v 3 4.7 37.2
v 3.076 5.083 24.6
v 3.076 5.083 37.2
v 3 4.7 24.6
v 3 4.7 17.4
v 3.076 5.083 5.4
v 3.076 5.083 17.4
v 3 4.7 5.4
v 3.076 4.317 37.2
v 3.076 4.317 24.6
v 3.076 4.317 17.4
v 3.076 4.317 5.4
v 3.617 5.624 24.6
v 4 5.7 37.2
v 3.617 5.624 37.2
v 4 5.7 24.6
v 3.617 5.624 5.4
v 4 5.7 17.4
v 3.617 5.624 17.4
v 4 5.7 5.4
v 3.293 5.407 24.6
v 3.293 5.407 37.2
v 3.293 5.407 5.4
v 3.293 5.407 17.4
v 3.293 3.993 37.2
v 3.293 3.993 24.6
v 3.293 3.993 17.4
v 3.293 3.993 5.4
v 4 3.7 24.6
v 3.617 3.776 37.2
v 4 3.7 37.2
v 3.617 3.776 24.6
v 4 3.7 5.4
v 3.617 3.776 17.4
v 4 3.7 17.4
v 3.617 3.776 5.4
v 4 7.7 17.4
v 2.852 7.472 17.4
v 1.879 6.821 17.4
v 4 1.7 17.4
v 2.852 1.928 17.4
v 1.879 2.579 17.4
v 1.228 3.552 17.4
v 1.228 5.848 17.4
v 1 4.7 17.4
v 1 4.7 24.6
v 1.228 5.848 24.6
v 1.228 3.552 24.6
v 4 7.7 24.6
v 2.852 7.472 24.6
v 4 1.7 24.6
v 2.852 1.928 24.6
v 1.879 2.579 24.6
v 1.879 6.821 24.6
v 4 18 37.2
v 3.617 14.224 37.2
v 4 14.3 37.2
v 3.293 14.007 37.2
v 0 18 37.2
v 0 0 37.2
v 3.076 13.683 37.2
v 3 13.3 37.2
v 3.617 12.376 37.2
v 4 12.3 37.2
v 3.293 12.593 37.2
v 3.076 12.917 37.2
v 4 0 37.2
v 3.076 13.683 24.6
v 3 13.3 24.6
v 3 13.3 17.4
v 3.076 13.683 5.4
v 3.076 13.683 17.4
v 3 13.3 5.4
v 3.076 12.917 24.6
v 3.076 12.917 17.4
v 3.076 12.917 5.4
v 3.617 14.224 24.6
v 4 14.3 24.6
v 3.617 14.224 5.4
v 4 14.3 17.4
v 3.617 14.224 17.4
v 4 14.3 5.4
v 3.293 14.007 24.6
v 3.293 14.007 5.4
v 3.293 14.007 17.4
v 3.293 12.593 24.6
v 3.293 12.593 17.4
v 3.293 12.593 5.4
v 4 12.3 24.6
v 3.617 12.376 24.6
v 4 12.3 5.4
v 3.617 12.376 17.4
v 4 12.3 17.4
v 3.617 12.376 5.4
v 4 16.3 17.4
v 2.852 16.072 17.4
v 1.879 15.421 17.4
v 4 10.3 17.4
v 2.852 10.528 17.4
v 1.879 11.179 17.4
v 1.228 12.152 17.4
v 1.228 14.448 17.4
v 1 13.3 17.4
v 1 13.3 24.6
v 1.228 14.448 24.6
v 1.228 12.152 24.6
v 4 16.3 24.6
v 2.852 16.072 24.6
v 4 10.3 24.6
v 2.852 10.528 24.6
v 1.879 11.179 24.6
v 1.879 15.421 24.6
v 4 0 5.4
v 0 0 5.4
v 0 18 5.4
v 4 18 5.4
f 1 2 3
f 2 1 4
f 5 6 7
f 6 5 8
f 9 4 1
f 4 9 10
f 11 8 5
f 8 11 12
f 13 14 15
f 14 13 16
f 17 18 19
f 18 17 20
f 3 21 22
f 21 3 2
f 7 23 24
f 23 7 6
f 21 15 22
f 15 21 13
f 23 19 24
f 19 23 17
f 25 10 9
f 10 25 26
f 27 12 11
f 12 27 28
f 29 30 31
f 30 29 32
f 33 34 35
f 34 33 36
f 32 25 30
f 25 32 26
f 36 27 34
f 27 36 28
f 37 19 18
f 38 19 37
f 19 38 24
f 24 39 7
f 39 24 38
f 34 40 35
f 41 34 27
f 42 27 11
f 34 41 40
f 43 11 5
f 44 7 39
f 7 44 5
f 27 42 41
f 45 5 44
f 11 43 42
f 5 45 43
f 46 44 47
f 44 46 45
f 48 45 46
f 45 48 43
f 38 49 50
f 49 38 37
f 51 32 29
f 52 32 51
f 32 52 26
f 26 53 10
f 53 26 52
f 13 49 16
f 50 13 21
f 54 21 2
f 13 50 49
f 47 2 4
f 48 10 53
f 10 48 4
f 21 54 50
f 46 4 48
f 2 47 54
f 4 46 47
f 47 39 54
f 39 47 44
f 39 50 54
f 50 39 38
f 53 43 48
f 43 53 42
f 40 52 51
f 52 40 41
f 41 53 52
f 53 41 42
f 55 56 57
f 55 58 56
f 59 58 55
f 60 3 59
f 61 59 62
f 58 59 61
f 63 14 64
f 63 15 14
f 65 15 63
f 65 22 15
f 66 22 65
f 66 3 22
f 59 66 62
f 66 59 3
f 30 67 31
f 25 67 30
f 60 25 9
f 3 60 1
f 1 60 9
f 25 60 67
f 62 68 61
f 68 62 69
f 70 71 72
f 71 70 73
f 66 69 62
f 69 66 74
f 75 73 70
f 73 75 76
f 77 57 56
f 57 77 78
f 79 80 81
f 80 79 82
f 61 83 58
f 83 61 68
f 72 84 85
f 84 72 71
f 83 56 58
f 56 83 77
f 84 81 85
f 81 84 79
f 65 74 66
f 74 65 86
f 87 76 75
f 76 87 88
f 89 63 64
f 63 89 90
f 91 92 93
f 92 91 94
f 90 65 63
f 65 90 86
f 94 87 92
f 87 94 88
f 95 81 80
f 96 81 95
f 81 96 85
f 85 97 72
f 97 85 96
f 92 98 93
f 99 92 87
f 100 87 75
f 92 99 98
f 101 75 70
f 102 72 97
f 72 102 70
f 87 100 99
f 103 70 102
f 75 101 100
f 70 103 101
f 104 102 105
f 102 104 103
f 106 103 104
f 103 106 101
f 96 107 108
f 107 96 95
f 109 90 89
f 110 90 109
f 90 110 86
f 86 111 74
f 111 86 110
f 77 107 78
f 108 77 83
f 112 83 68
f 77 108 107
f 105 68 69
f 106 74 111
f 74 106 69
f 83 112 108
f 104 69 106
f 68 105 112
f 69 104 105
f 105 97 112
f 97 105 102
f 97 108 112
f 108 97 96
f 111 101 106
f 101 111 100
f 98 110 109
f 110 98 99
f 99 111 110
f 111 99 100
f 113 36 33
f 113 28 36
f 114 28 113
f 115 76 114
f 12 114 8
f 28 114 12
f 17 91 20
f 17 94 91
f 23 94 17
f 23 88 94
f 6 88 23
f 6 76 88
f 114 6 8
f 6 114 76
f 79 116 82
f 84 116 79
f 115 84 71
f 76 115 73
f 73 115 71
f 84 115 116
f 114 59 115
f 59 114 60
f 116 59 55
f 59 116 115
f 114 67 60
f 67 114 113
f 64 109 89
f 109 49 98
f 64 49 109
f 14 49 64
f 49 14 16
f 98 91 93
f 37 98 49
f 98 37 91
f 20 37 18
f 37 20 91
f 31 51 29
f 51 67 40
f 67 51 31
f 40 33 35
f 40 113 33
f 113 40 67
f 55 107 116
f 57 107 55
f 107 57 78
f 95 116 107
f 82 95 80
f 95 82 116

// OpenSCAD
//Abstand linker zu rechter Rand der beiden Zwergstecker
a=10.6;
//Durchmesser Zwerstecker
d=2.6;
//Breite Zwergsteckerleiste
b=18;
//Tiefe Stecker
t=8;
//nageldurchmesser
nd=2;
//Nagellänge Total
nlt=24.6;
//Durchmesser Nagelkopf
dnk=4*1.5;
//Höhe Nagelkopf
hnk=1.8*4;
//Höhe wenn eingesteckt bis unter Nagelkopf
he=19.2;
//Tiefe eingesteckt (das nehmen wir eben oben am Stecker auch als Länge für den Kabelkanal 
te=nlt-he;
//Abstand Rand Loch von Rand Stecker
r=(b-a)/2;
//Und nun noch mit Versatz des Radius des Zwergensteckers
v=r+(d/2);

$fn=16;

module nagel_i()
{
cylinder(h = nlt-hnk, d=nd);
translate([0,0,nlt-hnk])
cylinder(h = hnk, d = dnk);
}
module nagel()
{
    color("#555555")
    nagel_i();
}


module zwerkstecker()
{
    color("orange")
    cylinder(h = nlt, d=d);
}

module metallstift()
{
    color("orange")
    cylinder(h = nlt, d=nd);
}

module nagelstecker()
{
    nagel();
translate([0,0,te+hnk])
//zwerkstecker();
metallstift();
    
    
}

//-(d-nd)/2 => da die metallstifte dünner sind, als die zwergstecker, bringe ich diese ganz nach außen, damit sie da Kontakt haben

module steckerlinks()
{

    translate([t/2,v-(d-nd)/2,0])
nagelstecker();
}

module steckerrechts()
{
translate([t/2,b-v+(d-nd)/2,0])
nagelstecker();
}

module gehaeuse()
{
translate([0,0,te])
cube([t,b,he+hnk+te]);
}

module stecker()
{
difference()
{
    gehaeuse();
    steckerlinks();
    steckerrechts();
}
}

module fertig()
{
difference()
{
    stecker();
    translate([t/2,0,0])
    gehaeuse();
}
}

//nagelstecker();
fertig();
